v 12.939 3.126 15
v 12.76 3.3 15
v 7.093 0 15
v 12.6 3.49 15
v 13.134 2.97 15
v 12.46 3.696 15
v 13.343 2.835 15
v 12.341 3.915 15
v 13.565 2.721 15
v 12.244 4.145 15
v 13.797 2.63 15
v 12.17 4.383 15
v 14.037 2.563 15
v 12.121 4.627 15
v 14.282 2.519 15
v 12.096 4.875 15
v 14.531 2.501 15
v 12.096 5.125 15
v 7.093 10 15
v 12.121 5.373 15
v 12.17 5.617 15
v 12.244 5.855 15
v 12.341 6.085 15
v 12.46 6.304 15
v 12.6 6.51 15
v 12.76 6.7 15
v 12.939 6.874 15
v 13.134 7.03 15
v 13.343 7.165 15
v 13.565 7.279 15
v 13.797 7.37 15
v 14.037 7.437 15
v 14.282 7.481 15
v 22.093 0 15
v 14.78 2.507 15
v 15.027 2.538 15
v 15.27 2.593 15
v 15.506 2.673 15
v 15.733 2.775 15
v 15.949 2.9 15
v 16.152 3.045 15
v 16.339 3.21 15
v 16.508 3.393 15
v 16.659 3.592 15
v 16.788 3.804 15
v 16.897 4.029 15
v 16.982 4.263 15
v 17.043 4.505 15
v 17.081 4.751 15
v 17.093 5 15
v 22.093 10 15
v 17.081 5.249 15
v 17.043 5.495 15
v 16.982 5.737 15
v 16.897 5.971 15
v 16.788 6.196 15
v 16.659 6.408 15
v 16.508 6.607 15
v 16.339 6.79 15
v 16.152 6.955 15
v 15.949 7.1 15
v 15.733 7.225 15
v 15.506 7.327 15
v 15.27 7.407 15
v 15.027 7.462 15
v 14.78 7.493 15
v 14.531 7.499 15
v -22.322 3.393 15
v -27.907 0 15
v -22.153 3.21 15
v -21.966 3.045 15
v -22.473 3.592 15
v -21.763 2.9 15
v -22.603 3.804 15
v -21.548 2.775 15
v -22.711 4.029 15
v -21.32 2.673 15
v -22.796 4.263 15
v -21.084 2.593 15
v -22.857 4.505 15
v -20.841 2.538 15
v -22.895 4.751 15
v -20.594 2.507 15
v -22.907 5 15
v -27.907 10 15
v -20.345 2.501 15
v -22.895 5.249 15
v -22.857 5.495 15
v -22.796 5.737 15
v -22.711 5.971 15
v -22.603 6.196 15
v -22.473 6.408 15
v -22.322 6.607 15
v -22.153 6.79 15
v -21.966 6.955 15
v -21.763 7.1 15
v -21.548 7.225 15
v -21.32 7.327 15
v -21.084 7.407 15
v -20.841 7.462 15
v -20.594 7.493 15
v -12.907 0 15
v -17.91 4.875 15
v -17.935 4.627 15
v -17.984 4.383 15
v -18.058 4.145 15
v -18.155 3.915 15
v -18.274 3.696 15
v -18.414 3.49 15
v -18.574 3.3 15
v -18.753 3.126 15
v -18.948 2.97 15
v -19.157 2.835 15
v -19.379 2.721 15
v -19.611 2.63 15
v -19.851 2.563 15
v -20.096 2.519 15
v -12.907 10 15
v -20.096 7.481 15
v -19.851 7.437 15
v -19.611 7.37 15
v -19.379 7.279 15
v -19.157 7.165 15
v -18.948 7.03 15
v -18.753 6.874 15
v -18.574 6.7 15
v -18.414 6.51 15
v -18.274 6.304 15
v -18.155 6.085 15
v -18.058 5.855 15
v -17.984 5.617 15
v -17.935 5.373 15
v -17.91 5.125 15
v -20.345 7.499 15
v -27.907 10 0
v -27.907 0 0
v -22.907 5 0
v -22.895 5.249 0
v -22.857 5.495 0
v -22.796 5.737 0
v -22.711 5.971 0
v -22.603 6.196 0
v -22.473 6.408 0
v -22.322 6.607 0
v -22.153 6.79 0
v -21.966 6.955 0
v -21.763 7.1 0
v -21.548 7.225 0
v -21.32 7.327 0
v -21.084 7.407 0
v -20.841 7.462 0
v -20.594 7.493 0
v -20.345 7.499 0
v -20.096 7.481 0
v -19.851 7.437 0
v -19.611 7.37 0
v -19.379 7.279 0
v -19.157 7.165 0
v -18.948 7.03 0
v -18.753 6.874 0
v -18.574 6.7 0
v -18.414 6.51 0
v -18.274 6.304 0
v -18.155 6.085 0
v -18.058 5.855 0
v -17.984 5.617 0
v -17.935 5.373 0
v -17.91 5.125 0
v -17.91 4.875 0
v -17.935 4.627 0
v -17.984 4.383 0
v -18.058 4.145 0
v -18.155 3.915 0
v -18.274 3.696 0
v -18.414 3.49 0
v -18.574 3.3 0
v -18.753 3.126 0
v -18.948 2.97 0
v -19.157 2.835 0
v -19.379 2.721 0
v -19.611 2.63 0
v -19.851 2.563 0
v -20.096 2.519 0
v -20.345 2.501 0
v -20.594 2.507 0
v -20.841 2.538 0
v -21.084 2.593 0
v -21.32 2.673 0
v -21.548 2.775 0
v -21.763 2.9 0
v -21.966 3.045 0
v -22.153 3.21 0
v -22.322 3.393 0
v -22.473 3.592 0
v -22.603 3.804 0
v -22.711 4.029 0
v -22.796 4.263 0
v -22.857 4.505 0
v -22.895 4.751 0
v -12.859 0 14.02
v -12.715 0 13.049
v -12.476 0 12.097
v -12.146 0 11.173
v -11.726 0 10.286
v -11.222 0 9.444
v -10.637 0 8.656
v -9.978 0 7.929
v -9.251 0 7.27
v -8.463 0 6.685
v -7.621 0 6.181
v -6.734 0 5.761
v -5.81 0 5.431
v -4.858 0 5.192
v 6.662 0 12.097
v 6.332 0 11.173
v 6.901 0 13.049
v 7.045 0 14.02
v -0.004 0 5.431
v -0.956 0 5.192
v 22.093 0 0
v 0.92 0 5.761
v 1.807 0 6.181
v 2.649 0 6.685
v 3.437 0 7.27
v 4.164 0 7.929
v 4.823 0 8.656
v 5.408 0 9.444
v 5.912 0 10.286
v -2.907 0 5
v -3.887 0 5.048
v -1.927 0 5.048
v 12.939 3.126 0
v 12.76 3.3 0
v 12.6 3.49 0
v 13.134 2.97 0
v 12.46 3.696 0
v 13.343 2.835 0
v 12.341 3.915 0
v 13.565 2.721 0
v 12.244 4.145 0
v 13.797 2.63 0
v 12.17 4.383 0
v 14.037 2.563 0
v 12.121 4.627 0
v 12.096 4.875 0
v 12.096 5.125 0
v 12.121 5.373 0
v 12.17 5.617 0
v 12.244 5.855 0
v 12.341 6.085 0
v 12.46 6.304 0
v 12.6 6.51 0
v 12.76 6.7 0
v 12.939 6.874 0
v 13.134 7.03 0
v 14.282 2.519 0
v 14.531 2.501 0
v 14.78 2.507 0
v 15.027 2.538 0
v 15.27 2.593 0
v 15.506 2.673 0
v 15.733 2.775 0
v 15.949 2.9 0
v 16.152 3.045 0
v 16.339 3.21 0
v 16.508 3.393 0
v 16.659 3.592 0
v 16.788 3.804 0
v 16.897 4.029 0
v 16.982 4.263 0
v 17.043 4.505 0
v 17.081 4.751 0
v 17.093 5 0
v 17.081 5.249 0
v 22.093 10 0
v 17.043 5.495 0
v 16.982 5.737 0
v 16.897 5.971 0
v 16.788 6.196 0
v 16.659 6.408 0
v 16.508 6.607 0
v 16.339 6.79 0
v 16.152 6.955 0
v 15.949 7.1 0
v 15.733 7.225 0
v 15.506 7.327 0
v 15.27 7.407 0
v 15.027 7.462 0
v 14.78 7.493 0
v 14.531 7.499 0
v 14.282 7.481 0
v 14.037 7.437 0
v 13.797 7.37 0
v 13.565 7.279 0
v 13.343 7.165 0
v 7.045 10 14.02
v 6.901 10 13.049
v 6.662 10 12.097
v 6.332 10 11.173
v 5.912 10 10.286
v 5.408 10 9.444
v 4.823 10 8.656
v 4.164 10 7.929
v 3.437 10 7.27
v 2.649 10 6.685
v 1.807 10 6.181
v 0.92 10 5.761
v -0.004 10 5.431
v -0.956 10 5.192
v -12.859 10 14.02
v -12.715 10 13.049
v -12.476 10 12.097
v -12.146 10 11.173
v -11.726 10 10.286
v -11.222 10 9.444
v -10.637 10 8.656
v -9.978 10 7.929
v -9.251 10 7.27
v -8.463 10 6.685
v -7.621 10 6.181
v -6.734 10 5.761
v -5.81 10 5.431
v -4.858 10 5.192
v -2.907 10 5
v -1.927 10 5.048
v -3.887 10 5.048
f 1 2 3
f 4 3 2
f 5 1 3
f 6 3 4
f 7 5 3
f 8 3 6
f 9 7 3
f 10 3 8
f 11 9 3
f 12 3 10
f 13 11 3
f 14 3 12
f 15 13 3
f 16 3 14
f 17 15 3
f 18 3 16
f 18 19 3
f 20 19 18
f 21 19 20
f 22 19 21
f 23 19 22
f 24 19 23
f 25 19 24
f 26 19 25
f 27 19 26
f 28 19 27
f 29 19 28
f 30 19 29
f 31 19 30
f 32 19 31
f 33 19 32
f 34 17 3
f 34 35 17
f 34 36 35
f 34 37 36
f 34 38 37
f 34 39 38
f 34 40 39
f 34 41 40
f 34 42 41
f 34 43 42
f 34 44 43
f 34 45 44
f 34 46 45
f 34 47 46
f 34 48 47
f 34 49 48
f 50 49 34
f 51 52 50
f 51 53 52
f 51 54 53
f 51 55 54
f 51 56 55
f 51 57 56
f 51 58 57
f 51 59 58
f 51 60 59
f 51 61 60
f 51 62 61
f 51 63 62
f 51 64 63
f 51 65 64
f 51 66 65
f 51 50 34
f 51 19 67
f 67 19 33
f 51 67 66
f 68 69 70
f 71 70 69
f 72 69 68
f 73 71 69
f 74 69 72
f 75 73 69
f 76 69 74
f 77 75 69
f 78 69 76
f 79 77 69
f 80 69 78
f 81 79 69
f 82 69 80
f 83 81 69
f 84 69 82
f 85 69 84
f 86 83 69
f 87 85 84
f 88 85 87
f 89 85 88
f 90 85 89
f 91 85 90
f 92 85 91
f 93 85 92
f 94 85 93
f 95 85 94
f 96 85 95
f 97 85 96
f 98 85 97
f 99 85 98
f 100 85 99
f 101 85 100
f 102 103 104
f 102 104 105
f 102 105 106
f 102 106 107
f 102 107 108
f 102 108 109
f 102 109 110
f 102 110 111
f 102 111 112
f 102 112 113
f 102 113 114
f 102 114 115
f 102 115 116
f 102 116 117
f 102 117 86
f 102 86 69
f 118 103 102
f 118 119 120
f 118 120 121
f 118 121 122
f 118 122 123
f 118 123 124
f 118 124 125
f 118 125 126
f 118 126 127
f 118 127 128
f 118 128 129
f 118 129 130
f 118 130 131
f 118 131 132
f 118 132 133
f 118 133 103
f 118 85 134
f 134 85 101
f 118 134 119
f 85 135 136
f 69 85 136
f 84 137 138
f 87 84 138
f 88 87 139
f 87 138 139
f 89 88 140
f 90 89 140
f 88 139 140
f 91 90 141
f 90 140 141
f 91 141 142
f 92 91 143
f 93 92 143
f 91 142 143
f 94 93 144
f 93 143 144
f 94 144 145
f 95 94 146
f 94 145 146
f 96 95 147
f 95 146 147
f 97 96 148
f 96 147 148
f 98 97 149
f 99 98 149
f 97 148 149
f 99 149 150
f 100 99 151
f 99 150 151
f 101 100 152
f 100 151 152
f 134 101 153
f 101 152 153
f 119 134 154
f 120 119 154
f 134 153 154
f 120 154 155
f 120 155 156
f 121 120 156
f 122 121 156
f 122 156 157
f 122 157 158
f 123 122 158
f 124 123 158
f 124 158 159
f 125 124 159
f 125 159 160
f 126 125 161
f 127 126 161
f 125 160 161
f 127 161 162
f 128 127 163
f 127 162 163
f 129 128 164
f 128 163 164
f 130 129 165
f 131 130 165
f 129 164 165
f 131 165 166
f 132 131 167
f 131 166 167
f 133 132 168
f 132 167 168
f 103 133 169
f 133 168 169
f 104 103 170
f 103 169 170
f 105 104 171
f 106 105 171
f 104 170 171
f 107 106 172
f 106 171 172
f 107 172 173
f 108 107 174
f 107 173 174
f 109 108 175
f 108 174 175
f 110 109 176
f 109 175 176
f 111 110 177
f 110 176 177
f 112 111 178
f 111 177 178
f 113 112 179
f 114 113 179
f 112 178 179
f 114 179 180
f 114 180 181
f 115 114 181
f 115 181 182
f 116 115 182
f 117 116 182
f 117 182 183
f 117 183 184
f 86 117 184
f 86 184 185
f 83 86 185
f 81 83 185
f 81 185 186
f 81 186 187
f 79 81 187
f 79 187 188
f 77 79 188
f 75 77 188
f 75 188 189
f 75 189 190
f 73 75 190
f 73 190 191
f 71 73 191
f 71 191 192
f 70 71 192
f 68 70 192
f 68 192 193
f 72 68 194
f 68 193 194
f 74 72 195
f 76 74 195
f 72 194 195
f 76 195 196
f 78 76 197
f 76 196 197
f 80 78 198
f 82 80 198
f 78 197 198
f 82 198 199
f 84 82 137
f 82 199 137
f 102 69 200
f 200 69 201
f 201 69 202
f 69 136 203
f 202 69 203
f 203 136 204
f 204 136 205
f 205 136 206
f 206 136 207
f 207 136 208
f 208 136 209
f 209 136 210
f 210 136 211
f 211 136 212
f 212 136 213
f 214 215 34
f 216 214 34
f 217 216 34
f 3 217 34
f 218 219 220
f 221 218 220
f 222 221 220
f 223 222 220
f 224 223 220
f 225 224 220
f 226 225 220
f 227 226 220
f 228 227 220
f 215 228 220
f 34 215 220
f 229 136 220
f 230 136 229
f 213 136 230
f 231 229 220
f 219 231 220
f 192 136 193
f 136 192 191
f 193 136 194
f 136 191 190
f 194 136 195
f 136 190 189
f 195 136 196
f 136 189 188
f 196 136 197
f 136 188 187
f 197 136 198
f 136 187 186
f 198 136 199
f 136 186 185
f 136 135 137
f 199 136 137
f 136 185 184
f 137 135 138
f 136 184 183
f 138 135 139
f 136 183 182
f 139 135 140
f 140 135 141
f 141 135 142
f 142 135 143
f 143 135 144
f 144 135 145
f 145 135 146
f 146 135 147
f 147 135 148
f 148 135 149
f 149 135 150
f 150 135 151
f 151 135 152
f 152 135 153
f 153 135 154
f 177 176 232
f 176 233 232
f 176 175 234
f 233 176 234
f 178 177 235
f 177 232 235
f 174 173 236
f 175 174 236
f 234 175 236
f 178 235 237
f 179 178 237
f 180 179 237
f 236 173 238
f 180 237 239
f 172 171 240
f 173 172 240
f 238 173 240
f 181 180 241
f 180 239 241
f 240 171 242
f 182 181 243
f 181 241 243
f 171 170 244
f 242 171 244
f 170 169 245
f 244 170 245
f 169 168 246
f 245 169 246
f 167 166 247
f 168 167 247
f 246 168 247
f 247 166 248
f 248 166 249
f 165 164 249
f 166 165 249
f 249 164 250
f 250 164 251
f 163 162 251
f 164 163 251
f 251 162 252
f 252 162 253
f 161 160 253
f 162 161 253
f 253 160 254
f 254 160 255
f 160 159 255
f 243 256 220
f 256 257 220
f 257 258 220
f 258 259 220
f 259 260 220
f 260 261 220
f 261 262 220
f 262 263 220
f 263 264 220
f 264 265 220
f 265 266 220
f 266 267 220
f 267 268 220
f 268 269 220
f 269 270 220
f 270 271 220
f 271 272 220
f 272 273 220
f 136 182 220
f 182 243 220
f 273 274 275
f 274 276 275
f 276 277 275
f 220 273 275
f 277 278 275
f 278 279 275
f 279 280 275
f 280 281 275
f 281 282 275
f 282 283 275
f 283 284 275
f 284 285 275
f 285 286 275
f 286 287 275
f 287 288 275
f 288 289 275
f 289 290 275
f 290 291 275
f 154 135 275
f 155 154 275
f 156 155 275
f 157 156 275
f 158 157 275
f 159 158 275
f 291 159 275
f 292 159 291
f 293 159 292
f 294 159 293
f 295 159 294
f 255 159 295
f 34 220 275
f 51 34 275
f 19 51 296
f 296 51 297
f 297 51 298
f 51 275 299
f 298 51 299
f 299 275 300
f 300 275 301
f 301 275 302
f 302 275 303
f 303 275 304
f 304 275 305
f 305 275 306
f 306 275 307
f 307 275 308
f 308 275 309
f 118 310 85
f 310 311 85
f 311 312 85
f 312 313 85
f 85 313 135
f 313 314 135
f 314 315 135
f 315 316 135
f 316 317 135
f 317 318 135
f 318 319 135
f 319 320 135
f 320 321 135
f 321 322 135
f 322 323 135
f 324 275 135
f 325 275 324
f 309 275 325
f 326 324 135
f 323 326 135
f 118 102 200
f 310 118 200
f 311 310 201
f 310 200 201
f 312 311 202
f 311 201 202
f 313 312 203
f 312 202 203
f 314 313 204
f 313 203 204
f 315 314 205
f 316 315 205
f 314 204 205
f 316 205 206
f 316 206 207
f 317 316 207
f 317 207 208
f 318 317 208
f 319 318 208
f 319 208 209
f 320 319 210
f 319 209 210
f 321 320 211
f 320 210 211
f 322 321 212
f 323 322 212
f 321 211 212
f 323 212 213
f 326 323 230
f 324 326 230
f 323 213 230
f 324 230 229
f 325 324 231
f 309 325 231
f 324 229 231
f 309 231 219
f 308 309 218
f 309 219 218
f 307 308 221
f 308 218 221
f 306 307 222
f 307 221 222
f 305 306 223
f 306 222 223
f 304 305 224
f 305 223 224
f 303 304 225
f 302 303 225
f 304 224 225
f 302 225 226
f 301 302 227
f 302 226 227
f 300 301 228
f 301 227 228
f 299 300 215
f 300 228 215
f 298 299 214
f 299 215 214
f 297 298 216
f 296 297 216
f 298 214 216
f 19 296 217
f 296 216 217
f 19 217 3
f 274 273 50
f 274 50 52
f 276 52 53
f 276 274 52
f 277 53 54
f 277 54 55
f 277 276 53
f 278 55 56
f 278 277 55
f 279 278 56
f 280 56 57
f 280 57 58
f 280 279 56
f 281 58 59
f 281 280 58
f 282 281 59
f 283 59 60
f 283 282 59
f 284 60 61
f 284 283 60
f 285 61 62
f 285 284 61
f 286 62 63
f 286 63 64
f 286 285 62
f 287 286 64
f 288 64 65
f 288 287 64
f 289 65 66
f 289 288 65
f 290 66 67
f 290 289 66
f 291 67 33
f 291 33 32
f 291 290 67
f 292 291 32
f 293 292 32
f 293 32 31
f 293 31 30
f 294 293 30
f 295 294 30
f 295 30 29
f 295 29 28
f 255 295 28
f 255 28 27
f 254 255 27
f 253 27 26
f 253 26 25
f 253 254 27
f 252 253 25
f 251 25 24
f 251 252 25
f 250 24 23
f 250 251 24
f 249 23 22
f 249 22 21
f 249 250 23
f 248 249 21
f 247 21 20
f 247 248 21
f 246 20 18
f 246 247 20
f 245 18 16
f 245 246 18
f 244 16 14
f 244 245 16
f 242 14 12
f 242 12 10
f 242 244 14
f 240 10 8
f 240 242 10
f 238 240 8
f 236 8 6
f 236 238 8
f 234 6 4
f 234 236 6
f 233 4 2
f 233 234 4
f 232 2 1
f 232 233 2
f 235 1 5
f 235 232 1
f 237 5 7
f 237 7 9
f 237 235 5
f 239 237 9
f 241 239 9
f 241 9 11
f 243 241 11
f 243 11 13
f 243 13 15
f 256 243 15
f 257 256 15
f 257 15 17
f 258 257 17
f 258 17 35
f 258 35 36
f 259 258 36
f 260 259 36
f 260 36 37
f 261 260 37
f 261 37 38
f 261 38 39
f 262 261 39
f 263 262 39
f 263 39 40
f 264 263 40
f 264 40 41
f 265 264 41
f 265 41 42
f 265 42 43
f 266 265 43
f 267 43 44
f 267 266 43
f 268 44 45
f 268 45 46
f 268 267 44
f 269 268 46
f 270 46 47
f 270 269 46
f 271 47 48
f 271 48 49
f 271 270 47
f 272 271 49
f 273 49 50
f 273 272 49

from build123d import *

# Parameters (mm, degrees)
F0_R     = 2.5
F1_DEPTH = 15
F3_DEPTH = 10


with BuildPart() as f1:
    # F0 (on Top) → F1 (new body)
    with BuildSketch(Plane.XY):
        with BuildLine():
            ThreePointArc((-17.907068, 5), (-20.407068, 7.5), (-22.907068, 5))
            ThreePointArc((-22.907068, 5), (-20.407068, 2.5), (-17.907068, 5))
        make_face()
        with Locations((14.592932, 5)):
            Circle(F0_R)
        Polygon((22.092932, 10), (-27.907068, 10), (-27.907068, 5), (-27.907068, 0), (22.092932, 0), (22.092932, 5), align=None)
        with BuildLine():
            ThreePointArc((-17.907068, 5), (-20.407068, 2.5), (-22.907068, 5))
            ThreePointArc((-22.907068, 5), (-20.407068, 7.5), (-17.907068, 5))
        make_face(mode=Mode.SUBTRACT)
        with Locations((14.592932, 5)):
            Circle(F0_R, mode=Mode.SUBTRACT)
    extrude(amount=F1_DEPTH)

    # F2 (on Front) → F3 (cut)
    with BuildSketch(Plane.XZ):
        with BuildLine():
            Line((7.092932, 15), (-12.907068, 15))
            ThreePointArc((-12.907068, 15), (-2.907068, 5), (7.092932, 15))
        make_face()
    extrude(amount=-F3_DEPTH, mode=Mode.SUBTRACT)


solid = f1.part
